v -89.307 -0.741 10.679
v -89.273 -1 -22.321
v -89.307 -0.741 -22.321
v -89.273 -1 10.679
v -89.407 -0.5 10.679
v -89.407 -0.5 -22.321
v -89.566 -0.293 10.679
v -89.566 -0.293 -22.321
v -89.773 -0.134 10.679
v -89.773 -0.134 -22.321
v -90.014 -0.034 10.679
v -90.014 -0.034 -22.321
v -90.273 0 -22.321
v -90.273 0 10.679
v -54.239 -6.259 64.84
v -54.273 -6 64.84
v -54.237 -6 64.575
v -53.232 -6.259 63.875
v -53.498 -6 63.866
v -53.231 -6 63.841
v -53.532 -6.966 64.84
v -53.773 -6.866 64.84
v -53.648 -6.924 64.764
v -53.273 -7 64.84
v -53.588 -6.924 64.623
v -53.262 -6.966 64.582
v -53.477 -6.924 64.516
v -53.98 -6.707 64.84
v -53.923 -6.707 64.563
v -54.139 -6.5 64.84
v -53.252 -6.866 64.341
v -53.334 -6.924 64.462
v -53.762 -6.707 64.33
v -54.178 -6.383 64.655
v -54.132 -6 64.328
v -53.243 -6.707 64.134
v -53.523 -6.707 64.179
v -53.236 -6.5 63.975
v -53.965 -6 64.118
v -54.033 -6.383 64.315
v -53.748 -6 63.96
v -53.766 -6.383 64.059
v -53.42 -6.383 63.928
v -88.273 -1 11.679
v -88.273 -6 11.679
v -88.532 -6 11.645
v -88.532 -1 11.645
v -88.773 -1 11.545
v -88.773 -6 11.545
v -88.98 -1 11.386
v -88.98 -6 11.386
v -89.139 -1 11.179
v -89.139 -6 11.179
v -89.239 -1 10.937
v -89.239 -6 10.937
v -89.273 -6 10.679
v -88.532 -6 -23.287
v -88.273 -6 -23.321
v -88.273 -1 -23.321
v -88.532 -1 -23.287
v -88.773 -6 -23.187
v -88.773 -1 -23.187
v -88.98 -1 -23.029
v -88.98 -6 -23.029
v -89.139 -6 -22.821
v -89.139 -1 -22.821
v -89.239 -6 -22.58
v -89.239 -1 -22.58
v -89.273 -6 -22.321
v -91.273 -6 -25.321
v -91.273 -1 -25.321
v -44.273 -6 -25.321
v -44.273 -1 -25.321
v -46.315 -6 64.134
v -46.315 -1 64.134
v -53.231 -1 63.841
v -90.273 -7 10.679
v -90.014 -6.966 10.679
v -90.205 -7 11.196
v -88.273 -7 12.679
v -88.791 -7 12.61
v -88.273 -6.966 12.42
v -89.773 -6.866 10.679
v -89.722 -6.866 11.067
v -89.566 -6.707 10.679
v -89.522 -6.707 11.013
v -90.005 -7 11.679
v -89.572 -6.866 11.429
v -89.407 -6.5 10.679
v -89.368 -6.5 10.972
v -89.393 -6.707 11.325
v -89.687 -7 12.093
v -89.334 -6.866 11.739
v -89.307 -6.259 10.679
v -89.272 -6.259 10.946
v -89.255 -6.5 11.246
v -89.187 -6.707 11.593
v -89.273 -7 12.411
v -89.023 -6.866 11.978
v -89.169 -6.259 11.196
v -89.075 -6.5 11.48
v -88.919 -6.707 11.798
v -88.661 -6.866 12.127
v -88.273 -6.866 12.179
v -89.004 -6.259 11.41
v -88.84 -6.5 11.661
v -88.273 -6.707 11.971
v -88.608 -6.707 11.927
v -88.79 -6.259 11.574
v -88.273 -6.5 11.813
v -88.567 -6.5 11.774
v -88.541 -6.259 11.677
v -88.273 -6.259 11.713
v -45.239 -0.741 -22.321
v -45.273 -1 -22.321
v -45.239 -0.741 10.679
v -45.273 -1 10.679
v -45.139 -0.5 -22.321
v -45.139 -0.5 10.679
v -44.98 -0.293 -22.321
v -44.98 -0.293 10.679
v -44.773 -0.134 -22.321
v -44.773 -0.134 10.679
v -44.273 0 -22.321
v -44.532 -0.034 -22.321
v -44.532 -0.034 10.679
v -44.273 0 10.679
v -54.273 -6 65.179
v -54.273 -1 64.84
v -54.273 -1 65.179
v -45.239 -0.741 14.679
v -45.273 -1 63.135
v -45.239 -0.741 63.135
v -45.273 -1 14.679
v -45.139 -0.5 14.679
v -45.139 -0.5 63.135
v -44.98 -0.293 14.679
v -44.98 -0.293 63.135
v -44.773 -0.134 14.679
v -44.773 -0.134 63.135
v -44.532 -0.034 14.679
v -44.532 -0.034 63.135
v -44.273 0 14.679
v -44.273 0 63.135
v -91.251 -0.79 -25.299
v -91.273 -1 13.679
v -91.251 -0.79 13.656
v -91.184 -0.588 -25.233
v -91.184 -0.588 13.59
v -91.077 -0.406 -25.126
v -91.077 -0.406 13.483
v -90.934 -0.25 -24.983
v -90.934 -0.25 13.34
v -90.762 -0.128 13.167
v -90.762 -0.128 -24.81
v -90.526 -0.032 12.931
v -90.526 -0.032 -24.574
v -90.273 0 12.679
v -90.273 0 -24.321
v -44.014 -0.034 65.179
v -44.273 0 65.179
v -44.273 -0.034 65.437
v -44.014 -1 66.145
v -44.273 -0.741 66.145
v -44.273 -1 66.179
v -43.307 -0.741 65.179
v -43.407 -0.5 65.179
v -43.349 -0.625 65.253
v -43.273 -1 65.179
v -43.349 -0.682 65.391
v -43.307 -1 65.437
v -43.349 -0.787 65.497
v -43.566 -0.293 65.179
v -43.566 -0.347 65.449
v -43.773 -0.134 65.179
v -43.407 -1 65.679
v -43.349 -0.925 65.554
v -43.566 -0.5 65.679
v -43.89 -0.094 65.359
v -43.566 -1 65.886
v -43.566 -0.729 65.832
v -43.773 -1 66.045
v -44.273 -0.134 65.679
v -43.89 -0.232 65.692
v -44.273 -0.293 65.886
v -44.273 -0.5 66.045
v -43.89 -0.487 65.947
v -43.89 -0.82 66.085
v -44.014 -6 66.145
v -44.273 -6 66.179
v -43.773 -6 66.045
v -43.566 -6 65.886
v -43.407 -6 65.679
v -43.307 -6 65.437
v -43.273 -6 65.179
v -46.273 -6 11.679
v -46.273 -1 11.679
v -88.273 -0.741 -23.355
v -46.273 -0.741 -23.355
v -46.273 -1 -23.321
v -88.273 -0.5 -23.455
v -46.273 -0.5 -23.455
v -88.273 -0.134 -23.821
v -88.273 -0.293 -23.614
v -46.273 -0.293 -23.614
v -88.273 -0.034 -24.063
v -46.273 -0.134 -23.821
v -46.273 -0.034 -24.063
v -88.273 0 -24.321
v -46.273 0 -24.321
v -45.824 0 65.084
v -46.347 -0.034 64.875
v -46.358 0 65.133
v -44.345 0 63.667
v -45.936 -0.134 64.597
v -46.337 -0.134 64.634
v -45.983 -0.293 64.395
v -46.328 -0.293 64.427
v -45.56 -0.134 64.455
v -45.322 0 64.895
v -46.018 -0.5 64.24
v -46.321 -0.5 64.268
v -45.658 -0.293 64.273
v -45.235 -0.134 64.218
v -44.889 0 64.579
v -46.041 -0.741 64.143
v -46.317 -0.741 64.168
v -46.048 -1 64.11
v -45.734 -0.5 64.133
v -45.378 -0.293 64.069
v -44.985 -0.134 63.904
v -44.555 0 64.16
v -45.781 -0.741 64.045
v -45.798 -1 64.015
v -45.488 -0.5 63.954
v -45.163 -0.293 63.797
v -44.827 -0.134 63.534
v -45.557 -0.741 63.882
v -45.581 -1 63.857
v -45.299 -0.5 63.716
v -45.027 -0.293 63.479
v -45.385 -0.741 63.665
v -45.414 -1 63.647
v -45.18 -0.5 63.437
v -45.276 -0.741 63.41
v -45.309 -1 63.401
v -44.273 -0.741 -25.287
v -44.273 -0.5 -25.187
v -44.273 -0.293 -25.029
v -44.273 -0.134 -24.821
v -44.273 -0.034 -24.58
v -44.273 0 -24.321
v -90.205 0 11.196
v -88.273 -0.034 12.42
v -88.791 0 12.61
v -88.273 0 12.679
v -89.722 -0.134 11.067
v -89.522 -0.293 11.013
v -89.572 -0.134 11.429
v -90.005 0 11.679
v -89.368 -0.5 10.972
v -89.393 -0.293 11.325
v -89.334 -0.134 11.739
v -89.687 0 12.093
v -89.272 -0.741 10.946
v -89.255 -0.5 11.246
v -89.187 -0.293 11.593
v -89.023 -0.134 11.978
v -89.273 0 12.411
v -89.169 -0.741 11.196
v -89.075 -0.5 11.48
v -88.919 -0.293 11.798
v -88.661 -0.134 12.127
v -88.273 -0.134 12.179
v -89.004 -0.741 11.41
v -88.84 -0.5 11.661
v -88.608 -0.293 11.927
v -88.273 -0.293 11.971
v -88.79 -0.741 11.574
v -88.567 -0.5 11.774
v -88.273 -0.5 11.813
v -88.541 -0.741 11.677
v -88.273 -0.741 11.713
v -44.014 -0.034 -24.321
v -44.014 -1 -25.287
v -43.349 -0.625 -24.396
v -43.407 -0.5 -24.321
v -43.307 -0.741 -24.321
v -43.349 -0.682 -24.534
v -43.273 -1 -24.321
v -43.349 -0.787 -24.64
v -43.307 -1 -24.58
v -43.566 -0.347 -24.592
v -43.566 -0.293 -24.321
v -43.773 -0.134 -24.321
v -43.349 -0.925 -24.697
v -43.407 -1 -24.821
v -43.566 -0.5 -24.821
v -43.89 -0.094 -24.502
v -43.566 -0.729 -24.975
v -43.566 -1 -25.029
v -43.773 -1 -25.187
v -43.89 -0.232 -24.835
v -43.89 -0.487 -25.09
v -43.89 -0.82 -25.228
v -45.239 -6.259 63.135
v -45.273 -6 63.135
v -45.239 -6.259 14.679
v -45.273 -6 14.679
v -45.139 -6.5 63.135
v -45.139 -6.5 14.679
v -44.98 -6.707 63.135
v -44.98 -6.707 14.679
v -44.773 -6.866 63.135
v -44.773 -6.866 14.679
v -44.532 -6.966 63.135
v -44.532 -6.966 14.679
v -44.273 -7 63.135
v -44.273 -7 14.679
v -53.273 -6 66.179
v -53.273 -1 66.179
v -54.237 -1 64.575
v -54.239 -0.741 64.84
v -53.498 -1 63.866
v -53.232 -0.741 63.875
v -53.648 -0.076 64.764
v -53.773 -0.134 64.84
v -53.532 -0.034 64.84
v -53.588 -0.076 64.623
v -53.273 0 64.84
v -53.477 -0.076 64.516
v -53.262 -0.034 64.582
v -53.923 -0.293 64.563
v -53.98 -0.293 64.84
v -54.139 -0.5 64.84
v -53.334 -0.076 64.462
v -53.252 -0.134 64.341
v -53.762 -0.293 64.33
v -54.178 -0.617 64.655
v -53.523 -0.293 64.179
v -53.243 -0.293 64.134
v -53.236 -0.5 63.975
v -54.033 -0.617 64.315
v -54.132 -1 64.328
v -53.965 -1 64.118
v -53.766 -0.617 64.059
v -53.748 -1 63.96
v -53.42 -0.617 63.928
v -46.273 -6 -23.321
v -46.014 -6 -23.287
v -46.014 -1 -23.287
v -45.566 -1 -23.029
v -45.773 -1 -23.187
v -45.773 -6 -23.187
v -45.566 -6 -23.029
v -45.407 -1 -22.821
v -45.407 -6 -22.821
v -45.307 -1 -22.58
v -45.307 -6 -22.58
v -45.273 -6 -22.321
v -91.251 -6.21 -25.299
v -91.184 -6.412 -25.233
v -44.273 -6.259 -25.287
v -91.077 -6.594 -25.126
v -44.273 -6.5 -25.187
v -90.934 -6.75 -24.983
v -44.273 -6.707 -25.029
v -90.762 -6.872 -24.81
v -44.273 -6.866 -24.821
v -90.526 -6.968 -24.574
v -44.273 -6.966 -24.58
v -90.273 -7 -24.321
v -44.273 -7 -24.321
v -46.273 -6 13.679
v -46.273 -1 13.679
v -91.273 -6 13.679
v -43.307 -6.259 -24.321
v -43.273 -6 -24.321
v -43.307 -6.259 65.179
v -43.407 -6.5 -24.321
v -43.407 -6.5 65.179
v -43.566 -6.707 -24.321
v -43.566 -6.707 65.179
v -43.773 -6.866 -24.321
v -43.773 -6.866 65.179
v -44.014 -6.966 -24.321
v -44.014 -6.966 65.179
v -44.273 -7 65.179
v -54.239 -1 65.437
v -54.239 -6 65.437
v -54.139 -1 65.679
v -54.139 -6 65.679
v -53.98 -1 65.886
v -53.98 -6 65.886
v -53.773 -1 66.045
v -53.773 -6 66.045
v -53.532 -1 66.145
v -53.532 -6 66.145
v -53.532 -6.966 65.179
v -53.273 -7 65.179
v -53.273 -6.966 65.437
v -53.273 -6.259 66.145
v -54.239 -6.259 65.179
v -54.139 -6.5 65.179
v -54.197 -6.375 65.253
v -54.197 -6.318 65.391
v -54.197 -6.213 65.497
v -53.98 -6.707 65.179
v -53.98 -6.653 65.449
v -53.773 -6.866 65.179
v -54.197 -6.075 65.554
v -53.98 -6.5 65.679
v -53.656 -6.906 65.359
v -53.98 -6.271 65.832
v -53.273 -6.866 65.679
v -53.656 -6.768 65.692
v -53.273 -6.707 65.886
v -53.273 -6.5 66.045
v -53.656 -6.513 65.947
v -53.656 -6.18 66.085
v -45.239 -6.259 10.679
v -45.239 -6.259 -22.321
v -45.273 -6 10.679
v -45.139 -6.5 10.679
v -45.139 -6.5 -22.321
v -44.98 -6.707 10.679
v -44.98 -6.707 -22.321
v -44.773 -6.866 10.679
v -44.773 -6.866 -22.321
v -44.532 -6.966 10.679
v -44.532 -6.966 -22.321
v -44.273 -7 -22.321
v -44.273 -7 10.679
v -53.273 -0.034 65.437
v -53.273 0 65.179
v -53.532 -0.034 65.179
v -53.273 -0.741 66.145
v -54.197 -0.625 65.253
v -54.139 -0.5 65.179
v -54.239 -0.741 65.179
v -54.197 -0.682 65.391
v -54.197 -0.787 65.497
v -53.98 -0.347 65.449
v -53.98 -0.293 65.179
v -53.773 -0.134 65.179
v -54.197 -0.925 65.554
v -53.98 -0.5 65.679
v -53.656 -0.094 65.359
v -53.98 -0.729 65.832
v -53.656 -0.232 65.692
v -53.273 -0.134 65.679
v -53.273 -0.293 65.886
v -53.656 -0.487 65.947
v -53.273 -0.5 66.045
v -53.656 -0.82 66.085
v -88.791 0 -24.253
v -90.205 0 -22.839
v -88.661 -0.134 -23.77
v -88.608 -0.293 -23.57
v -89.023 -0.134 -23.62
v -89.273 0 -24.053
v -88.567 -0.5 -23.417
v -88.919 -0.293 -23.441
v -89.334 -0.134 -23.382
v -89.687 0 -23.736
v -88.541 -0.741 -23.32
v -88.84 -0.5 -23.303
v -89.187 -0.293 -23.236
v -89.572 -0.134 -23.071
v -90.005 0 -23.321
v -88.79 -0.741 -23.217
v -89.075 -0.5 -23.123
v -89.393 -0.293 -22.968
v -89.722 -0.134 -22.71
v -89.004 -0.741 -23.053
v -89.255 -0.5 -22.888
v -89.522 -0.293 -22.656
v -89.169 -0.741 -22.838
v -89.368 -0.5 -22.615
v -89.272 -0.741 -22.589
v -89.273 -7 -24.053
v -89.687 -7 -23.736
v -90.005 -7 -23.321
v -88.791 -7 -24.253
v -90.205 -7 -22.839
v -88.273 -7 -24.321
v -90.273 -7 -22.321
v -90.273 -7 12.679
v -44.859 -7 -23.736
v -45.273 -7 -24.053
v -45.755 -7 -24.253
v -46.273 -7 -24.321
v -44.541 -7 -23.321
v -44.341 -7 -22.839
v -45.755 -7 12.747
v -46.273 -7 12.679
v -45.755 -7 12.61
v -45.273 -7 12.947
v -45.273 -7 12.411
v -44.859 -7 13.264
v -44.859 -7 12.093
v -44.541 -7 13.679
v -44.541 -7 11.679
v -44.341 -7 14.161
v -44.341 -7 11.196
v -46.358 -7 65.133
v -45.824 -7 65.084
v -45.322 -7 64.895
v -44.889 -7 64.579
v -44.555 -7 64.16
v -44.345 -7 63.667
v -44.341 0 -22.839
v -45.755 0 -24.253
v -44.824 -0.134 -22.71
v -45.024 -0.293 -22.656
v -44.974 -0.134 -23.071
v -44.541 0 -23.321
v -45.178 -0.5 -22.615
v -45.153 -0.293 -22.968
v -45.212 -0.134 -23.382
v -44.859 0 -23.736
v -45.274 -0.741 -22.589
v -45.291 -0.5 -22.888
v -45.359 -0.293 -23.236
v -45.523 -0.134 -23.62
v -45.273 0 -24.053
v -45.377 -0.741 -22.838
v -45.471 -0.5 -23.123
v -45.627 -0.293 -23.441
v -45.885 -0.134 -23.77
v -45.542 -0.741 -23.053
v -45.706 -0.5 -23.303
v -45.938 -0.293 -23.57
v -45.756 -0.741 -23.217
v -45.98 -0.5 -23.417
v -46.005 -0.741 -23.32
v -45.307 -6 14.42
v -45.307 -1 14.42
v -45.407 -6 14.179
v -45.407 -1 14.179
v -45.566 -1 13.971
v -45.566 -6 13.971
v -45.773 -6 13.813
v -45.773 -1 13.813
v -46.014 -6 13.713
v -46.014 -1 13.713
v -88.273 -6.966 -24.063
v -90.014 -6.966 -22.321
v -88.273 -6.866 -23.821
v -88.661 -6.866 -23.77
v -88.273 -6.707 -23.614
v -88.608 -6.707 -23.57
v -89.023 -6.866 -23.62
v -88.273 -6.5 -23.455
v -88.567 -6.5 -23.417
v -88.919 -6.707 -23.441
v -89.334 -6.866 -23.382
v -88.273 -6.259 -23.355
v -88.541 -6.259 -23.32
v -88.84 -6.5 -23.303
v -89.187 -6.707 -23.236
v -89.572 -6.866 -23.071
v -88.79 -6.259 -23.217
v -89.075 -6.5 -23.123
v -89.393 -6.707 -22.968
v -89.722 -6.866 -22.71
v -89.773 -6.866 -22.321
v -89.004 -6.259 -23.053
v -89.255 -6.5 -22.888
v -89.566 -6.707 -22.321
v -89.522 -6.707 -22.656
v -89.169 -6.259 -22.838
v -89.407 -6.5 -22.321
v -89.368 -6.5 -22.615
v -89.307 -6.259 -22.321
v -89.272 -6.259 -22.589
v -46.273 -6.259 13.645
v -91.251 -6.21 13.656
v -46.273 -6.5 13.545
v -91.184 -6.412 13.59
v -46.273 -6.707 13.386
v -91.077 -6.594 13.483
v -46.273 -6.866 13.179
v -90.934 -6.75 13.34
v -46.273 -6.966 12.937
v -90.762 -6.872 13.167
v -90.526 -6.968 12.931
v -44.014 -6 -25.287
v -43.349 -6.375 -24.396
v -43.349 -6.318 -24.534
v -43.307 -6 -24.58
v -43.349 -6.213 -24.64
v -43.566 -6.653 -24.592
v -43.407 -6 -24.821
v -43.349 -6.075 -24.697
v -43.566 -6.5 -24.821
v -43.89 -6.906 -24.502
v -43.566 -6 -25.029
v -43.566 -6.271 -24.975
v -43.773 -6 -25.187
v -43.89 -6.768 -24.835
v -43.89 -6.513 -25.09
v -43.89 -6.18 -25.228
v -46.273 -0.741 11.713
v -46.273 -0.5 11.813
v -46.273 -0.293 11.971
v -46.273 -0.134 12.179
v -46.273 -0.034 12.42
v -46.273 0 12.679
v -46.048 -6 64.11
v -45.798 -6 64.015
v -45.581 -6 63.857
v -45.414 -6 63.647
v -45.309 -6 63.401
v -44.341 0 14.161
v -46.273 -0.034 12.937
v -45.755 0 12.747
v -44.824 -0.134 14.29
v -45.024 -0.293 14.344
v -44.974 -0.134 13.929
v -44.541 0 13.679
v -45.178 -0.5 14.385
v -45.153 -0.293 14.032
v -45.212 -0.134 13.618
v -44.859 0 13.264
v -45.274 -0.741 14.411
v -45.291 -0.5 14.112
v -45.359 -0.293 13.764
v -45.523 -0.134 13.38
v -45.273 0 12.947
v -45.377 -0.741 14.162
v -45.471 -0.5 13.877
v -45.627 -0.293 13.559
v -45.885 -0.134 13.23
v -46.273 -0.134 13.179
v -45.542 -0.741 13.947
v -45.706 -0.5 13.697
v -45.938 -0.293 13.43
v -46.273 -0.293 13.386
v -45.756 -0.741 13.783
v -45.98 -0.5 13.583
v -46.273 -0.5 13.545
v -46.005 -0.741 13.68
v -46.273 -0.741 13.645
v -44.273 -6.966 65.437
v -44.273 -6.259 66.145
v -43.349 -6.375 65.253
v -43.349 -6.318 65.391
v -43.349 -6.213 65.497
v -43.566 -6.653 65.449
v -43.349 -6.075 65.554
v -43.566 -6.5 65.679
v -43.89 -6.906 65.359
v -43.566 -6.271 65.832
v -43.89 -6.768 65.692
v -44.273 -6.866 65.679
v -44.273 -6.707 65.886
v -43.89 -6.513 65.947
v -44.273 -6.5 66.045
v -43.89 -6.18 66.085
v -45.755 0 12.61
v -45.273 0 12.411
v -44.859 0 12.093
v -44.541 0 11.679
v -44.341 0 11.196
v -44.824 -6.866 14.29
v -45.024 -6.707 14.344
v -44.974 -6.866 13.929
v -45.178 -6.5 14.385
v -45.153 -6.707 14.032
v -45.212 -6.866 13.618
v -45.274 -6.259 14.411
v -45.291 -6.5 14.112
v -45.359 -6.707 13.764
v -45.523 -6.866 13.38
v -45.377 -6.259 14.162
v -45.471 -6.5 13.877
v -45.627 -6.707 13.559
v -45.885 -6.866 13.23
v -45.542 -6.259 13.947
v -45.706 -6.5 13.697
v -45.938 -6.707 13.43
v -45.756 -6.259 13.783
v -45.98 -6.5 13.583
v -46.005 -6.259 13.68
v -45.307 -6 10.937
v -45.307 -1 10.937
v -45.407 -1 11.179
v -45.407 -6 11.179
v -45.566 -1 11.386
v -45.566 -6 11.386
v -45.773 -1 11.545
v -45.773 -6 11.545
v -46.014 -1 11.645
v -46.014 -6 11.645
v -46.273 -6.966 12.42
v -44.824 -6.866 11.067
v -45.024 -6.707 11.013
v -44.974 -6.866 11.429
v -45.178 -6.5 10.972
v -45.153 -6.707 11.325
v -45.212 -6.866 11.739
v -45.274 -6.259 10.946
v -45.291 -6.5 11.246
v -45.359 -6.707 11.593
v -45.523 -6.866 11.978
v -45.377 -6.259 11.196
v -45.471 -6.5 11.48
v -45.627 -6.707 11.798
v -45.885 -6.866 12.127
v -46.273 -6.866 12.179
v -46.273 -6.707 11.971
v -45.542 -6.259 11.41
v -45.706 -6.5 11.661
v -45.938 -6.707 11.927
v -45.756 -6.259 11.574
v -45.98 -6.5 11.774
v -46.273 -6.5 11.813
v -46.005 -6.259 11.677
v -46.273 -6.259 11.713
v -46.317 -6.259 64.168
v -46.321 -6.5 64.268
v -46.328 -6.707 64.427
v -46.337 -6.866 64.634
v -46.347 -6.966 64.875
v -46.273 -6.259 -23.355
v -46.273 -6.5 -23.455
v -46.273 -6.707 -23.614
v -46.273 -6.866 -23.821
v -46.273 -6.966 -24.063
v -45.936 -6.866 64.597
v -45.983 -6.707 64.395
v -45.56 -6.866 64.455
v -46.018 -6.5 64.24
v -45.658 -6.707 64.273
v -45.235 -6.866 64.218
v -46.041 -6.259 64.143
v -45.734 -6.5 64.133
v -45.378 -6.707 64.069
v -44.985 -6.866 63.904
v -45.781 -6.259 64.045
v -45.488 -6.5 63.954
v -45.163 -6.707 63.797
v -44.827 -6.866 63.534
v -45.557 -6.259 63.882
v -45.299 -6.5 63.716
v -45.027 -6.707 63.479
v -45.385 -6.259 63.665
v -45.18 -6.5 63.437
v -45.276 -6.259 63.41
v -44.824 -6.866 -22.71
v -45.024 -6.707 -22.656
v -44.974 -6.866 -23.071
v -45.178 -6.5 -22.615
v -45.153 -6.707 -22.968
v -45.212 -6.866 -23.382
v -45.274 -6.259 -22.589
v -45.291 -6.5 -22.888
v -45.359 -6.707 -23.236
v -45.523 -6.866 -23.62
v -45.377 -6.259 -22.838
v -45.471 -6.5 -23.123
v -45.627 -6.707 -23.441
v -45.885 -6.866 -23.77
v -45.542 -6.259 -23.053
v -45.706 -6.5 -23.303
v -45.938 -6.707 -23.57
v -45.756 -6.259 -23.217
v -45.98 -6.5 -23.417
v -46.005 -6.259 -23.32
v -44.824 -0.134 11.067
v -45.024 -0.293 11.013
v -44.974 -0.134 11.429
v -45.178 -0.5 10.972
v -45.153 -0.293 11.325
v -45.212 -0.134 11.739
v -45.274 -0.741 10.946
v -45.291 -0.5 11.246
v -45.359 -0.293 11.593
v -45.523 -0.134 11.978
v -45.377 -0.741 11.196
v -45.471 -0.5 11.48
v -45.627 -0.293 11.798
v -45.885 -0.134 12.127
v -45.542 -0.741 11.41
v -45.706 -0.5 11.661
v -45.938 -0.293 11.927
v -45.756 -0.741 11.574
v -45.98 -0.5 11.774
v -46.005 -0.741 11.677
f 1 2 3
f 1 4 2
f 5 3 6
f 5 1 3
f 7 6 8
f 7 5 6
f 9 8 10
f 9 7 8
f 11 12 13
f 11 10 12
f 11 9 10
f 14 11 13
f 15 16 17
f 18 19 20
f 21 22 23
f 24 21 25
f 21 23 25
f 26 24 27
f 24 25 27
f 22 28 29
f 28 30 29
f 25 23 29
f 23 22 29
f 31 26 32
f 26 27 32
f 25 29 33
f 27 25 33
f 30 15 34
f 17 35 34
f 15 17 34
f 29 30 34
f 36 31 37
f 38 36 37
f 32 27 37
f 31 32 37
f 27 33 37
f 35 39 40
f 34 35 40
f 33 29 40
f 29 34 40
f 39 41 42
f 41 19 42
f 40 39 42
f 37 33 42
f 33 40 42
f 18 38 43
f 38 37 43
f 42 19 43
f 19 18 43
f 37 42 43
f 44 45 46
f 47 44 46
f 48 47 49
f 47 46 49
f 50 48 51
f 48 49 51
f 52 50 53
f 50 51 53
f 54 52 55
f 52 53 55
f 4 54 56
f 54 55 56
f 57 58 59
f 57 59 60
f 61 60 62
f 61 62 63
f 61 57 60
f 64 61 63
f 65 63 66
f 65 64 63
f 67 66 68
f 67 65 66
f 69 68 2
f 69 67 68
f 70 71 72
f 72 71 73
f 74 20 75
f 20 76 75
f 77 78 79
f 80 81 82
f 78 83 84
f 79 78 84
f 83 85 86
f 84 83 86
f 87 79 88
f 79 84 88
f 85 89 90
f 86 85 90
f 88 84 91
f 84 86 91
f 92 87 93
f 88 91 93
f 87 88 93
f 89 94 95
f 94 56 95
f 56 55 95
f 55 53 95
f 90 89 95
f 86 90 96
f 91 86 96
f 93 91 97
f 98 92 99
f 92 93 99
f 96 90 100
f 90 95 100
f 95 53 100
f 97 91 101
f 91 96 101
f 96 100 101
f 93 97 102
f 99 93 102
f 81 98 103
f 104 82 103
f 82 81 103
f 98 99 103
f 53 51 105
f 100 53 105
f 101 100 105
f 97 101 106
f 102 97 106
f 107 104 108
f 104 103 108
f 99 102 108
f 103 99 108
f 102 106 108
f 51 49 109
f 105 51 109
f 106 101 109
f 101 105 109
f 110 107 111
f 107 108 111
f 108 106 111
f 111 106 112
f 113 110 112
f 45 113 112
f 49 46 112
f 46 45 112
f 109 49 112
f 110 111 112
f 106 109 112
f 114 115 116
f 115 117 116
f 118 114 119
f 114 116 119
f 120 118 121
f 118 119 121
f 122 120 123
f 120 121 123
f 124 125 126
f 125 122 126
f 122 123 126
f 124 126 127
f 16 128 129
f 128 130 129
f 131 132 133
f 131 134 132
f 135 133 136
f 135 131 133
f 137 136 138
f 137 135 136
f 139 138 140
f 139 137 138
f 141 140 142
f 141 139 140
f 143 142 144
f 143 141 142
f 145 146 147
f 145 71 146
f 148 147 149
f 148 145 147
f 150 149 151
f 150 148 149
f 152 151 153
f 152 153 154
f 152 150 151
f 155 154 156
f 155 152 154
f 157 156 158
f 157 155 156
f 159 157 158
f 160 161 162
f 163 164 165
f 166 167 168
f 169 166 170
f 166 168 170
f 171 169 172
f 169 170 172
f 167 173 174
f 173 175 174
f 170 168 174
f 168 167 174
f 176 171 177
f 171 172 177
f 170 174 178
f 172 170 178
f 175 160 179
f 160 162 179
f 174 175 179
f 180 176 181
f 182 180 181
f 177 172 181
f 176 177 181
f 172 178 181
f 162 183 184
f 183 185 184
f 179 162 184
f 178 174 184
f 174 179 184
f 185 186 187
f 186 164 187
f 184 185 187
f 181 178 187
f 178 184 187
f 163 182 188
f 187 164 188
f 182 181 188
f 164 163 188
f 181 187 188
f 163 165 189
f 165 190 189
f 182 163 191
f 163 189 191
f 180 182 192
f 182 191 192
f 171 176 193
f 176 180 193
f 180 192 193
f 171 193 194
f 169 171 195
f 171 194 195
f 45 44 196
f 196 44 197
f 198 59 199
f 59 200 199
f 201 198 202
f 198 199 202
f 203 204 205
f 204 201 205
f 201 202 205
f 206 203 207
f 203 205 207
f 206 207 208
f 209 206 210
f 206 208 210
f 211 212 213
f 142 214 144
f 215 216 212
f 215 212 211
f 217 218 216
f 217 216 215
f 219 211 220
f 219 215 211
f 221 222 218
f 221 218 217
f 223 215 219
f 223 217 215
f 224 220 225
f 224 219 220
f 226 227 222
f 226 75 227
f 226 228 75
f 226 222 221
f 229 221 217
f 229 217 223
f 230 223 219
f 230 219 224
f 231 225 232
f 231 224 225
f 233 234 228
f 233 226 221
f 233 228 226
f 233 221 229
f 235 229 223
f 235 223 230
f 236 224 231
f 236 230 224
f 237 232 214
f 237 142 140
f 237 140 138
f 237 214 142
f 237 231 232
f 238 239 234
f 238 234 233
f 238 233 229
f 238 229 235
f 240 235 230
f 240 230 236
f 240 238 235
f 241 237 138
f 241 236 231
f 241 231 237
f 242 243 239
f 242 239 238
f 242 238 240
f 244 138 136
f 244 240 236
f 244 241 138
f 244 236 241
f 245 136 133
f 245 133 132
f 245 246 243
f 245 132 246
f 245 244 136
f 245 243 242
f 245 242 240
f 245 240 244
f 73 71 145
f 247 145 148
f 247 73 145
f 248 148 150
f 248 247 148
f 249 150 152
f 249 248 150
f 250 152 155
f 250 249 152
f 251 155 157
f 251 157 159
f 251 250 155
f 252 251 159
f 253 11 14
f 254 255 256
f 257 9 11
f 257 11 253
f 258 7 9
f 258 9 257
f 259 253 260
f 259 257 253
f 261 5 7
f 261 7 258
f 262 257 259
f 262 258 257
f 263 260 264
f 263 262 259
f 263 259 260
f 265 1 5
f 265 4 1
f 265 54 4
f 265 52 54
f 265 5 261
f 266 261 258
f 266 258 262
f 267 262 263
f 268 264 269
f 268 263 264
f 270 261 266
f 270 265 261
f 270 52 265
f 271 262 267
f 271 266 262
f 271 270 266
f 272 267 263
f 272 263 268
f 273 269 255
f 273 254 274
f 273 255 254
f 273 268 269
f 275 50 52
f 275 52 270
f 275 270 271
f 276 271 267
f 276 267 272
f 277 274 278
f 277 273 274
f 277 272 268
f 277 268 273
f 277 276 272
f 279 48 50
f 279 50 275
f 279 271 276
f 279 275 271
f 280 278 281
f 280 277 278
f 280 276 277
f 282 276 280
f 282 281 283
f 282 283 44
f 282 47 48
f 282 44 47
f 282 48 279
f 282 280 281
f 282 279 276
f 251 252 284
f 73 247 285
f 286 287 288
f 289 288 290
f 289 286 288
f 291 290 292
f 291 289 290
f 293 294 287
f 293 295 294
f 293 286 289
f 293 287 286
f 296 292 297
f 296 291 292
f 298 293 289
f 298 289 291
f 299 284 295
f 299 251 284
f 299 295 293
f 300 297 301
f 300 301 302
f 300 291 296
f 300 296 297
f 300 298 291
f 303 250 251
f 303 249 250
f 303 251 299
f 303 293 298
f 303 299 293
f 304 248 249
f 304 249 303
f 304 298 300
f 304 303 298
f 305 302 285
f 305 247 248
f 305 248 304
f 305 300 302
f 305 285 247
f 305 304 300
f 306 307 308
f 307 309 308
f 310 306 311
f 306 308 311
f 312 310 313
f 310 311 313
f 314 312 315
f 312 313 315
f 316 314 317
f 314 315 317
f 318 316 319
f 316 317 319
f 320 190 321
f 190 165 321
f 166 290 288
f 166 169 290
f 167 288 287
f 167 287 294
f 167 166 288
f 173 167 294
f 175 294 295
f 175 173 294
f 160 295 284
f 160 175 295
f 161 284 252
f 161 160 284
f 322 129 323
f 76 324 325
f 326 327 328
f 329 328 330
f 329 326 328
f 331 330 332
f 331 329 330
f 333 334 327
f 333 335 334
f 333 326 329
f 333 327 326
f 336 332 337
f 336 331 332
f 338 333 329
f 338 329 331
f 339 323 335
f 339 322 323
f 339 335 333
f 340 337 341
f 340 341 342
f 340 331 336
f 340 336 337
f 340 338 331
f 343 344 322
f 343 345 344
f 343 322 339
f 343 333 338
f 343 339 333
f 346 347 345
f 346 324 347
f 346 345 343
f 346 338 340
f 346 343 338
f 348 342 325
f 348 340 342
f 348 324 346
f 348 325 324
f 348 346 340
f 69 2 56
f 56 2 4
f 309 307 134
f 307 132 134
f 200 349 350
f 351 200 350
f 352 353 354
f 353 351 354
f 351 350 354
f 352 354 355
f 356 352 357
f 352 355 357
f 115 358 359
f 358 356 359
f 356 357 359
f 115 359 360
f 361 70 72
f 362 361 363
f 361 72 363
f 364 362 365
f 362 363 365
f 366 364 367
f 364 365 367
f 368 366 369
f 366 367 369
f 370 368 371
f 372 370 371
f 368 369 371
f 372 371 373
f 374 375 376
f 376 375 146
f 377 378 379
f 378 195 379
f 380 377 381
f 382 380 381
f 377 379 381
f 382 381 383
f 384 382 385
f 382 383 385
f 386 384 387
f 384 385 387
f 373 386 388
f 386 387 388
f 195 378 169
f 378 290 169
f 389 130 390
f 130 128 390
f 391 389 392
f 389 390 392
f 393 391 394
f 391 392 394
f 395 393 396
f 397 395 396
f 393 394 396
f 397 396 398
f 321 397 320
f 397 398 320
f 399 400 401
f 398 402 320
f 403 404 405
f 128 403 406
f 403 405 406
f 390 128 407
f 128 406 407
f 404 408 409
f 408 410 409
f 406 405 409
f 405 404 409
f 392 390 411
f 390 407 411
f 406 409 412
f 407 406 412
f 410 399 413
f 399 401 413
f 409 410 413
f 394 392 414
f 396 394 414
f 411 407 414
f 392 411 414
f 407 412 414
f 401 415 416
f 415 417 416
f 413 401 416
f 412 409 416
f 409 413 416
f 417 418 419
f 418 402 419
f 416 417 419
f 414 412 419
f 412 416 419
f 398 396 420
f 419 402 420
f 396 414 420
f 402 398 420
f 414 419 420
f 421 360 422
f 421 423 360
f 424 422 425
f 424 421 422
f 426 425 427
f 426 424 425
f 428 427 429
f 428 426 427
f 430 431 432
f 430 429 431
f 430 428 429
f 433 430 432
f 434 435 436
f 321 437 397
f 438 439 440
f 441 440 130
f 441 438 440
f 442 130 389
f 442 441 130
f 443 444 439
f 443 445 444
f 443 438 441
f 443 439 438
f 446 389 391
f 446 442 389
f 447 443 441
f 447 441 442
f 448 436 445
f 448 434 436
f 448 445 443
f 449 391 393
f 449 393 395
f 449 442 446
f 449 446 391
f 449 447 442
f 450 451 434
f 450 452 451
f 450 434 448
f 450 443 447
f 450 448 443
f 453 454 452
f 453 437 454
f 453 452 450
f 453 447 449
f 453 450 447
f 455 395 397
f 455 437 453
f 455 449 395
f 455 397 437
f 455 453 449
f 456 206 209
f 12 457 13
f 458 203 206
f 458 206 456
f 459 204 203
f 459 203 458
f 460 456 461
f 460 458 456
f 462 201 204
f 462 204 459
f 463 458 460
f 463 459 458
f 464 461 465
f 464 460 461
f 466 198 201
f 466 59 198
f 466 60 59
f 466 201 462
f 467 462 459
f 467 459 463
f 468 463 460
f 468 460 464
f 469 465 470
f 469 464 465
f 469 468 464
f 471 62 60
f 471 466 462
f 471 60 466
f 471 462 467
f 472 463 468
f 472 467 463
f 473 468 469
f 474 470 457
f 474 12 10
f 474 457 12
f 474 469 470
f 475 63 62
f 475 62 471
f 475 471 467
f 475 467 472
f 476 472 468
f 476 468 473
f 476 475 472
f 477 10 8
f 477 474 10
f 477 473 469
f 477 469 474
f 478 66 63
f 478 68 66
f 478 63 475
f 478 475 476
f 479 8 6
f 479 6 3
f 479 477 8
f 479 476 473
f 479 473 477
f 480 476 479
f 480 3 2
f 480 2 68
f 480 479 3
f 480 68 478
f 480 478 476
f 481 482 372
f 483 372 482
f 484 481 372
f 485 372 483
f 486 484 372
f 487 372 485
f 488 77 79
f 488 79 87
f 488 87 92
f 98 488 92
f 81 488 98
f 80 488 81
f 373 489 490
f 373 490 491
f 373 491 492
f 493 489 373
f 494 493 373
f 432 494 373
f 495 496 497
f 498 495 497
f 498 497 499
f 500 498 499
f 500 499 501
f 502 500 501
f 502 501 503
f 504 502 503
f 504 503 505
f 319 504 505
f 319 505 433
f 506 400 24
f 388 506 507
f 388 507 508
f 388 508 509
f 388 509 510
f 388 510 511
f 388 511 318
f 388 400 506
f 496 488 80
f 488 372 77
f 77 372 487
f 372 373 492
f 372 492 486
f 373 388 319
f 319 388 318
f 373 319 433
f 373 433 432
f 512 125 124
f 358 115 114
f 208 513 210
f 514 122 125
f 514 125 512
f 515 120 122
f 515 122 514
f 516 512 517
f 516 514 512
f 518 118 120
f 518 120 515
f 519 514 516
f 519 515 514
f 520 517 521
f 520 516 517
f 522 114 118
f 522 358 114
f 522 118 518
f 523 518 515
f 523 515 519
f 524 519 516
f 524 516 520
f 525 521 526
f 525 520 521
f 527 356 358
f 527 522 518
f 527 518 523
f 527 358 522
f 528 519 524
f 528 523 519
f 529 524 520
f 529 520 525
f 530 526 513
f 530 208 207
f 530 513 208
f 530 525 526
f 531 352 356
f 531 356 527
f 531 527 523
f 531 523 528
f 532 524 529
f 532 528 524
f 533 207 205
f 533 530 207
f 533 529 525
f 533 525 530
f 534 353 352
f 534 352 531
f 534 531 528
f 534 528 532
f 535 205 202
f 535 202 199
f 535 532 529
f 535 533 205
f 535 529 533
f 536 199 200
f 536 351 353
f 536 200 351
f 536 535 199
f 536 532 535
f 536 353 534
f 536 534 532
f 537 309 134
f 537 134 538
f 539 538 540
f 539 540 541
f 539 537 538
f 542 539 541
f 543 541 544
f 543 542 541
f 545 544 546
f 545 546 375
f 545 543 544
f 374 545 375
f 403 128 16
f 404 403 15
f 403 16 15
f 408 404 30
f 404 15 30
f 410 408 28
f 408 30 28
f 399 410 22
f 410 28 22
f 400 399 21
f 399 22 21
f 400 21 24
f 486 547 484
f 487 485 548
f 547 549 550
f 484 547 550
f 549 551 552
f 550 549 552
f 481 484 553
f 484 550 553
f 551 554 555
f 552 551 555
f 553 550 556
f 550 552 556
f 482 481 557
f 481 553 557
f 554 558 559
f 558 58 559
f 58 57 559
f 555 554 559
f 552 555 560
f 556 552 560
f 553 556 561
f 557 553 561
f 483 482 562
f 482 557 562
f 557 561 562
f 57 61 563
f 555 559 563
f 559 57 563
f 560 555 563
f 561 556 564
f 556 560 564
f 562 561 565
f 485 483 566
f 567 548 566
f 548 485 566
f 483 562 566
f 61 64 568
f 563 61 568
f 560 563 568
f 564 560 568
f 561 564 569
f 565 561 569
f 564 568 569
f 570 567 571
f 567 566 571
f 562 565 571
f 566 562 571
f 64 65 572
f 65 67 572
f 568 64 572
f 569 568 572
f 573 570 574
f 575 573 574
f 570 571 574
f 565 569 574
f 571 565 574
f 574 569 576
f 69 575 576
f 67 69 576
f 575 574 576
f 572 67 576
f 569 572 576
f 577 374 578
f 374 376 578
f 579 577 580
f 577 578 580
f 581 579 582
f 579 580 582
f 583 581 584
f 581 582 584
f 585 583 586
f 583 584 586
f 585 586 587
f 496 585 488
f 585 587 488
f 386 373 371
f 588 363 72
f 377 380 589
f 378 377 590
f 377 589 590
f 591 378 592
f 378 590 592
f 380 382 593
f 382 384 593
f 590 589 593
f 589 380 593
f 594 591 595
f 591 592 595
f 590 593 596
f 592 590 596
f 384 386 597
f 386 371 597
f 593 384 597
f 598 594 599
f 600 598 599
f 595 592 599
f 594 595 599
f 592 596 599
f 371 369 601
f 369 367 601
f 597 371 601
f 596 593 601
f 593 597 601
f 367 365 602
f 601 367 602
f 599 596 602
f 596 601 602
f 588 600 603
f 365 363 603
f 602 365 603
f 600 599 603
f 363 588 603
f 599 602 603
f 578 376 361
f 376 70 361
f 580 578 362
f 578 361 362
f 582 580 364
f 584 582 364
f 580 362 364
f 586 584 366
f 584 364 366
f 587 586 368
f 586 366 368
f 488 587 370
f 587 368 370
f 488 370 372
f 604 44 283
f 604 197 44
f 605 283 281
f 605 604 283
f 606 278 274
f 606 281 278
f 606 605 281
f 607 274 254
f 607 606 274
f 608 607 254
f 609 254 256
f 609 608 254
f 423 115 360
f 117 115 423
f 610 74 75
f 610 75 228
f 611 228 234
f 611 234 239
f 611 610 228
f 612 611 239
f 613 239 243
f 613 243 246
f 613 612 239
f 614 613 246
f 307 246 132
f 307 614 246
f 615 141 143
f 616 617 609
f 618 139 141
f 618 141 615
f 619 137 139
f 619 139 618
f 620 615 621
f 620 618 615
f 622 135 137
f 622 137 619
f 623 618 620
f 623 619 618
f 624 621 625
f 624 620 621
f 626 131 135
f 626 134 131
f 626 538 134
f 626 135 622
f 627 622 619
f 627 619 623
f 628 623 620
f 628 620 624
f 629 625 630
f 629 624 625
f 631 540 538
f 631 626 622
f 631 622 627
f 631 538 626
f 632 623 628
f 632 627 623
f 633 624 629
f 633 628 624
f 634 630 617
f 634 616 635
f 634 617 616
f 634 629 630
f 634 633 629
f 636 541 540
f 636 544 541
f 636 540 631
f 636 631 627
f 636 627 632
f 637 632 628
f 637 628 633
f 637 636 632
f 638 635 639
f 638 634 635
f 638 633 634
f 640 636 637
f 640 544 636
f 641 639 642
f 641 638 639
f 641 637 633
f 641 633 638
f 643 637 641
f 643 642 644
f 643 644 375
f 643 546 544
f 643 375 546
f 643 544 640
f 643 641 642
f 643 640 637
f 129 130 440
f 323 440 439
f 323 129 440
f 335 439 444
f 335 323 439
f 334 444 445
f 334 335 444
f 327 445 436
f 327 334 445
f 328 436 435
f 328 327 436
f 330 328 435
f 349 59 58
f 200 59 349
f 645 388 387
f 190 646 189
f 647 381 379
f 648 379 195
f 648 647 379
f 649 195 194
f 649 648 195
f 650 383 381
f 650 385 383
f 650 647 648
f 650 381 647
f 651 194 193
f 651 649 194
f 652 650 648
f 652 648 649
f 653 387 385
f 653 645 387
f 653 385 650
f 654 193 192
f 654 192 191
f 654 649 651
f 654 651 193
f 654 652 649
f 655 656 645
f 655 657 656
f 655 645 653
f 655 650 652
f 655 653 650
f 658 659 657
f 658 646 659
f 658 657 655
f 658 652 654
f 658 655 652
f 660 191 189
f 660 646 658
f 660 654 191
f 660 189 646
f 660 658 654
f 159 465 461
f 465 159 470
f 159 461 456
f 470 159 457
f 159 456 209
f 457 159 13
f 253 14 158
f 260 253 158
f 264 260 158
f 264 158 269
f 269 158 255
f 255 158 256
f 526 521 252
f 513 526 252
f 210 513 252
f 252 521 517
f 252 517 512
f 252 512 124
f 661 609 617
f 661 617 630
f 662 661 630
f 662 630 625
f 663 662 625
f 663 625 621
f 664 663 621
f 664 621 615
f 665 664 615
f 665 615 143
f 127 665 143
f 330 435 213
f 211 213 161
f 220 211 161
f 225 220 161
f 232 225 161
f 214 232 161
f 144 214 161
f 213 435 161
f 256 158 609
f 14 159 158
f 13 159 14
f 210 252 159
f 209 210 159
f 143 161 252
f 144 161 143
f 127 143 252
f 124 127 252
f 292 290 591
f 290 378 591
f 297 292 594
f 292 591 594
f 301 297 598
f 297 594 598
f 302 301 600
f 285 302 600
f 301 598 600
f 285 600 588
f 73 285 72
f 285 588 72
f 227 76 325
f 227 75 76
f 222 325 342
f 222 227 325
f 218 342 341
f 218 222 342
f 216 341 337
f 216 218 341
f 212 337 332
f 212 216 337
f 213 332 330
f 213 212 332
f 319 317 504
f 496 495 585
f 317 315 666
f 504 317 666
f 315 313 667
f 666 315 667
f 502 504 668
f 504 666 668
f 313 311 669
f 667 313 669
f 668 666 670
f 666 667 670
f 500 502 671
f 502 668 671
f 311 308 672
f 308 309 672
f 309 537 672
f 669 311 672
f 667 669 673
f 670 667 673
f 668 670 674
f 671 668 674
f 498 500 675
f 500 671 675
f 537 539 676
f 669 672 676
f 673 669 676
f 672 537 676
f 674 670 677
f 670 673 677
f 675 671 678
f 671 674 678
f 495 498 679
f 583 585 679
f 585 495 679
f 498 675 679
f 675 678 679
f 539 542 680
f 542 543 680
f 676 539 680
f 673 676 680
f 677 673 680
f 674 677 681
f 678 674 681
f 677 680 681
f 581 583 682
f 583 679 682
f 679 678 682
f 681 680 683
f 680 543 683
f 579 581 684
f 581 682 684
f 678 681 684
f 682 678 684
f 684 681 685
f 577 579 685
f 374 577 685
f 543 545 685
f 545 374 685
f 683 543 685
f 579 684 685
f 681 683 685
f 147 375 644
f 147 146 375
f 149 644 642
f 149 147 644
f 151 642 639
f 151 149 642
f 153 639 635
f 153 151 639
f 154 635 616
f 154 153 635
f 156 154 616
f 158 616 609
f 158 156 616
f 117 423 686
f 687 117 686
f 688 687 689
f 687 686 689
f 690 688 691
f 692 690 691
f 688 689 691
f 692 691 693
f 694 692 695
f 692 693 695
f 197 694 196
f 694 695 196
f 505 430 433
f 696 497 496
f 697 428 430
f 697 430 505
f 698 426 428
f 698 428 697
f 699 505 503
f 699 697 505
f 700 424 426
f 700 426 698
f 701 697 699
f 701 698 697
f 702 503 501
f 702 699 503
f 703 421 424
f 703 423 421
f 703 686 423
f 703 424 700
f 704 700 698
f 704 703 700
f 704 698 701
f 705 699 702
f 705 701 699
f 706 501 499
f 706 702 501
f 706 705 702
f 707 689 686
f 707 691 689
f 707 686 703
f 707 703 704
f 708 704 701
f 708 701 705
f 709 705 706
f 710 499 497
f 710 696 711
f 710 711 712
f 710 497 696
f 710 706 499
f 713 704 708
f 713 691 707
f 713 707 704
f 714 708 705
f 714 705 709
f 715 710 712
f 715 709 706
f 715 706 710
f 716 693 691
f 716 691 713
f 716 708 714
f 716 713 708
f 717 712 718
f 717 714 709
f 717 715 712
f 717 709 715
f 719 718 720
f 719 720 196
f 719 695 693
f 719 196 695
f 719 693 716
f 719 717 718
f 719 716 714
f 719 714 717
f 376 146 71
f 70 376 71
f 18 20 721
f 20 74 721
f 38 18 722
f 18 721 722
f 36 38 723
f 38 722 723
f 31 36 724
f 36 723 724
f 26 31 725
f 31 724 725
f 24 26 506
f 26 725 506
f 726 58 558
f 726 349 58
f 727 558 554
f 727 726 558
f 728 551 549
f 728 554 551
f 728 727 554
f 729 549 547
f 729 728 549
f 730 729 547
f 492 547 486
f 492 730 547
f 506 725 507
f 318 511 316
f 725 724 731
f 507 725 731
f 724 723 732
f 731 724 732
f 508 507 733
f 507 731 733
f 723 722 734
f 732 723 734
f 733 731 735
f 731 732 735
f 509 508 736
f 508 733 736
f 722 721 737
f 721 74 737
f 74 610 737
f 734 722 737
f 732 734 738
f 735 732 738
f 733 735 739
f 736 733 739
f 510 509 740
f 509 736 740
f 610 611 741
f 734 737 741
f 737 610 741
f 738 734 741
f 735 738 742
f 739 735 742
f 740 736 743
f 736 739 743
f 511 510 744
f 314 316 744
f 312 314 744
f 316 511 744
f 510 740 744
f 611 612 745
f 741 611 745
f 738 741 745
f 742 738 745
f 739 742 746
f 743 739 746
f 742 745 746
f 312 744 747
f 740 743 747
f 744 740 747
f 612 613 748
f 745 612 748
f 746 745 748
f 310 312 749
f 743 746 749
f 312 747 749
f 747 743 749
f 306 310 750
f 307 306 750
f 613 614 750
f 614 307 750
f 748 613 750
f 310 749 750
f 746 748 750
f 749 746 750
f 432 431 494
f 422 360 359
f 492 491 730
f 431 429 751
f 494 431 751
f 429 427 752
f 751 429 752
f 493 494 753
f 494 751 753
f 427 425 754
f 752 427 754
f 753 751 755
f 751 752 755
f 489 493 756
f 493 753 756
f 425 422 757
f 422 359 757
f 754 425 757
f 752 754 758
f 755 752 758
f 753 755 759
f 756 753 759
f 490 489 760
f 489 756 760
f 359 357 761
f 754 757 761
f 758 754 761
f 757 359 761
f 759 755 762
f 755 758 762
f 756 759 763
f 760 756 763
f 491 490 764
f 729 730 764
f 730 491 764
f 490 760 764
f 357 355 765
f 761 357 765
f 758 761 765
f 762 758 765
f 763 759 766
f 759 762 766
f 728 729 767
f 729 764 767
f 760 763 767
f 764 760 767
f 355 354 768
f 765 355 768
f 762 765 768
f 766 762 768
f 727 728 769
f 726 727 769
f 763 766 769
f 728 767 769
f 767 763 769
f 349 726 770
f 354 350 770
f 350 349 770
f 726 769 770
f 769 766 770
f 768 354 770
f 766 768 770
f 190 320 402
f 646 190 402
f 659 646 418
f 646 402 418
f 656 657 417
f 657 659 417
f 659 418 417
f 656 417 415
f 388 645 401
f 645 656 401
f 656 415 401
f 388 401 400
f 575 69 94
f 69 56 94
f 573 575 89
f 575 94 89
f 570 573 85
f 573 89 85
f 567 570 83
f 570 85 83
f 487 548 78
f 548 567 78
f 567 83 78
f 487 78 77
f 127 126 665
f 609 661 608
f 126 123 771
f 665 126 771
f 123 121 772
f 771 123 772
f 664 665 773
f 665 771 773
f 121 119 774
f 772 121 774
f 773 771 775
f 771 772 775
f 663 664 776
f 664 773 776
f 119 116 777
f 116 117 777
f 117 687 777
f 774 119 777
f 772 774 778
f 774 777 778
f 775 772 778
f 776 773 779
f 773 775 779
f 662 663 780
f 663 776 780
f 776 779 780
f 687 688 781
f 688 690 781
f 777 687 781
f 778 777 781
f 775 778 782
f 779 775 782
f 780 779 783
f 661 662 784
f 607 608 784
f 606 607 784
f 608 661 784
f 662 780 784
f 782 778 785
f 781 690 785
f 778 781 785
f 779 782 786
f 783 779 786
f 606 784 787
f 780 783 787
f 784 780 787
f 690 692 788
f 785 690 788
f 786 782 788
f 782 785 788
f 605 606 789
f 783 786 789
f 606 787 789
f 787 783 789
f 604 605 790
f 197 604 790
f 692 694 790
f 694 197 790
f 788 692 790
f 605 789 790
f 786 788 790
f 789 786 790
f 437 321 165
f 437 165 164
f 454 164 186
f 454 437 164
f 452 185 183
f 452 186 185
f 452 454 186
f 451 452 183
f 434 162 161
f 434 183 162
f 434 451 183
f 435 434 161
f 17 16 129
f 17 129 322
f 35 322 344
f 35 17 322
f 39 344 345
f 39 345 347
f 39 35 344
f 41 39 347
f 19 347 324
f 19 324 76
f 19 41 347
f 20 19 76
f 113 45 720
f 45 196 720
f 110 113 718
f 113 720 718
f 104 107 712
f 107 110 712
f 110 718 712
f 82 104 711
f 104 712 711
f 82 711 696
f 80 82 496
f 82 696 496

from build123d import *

# Parameters (mm, degrees)
F0_W     = 44
F0_H     = 35
F1_DEPTH = 7
F2_R     = 0.99999


# Not quite as in the source:
# - a fillet or chamfer is up to 0.001 mm smaller than in the source, because OpenCascade refuses the exact size


with BuildPart() as f1:
    # F0 (on Front) → F1 (new body)
    with BuildSketch(Plane.XZ):
        Polygon((-54.2730142517, 66.1785921497), (-54.2730142517, 63.7968573394), (-45.2730142517, 64.1785921497), (-45.2730142517, 13.6785921497), (-91.2730142517, 13.6785921497), (-91.2730142517, 11.6785921497), (-91.2730142517, -23.3214078503), (-91.2730142517, -25.3214078503), (-43.2730142517, -25.3214078503), (-43.2730142517, 66.1785921497), align=None)
        with Locations((-67.2730142517, -5.8214078503)):
            Rectangle(F0_W, F0_H, mode=Mode.SUBTRACT)
    extrude(amount=F1_DEPTH)

    # F2 (radius 1 in the source; OpenCascade refuses exactly that, so slightly less here)
    f2_edges = [f1.edges().sort_by_distance(p)[0] for p in [
        (-48.773014, -7, 66.178592),
        (-54.273014, -7, 64.987725),
        (-49.773014, -7, 63.987725),
        (-45.273014, -7, 38.928592),
        (-68.273014, -7, 13.678592),
        (-91.273014, -7, -5.821408),
        (-67.273014, -7, -25.321408),
        (-43.273014, -7, 20.428592),
        (-45.273014, -7, -5.821408),
        (-67.273014, -7, -23.321408),
        (-89.273014, -7, -5.821408),
        (-67.273014, -7, 11.678592),
        (-48.773014, 0, 66.178592),
        (-54.273014, 0, 64.987725),
        (-49.773014, 0, 63.987725),
        (-45.273014, 0, 38.928592),
        (-68.273014, 0, 13.678592),
        (-91.273014, 0, -5.821408),
        (-67.273014, 0, -25.321408),
        (-43.273014, 0, 20.428592),
        (-45.273014, 0, -5.821408),
        (-67.273014, 0, -23.321408),
        (-89.273014, 0, -5.821408),
        (-67.273014, 0, 11.678592),
        (-45.273014, -3.5, 11.678592),
        (-45.273014, -3.5, -23.321408),
        (-89.273014, -3.5, 11.678592),
        (-89.273014, -3.5, -23.321408),
        (-54.273014, -3.5, 63.796857),
        (-45.273014, -3.5, 64.178592),
        (-54.273014, -3.5, 66.178592),
        (-43.273014, -3.5, 66.178592),
        (-45.273014, -3.5, 13.678592),
        (-43.273014, -3.5, -25.321408),
    ]]
    fillet(f2_edges, radius=F2_R)


solid = f1.part
